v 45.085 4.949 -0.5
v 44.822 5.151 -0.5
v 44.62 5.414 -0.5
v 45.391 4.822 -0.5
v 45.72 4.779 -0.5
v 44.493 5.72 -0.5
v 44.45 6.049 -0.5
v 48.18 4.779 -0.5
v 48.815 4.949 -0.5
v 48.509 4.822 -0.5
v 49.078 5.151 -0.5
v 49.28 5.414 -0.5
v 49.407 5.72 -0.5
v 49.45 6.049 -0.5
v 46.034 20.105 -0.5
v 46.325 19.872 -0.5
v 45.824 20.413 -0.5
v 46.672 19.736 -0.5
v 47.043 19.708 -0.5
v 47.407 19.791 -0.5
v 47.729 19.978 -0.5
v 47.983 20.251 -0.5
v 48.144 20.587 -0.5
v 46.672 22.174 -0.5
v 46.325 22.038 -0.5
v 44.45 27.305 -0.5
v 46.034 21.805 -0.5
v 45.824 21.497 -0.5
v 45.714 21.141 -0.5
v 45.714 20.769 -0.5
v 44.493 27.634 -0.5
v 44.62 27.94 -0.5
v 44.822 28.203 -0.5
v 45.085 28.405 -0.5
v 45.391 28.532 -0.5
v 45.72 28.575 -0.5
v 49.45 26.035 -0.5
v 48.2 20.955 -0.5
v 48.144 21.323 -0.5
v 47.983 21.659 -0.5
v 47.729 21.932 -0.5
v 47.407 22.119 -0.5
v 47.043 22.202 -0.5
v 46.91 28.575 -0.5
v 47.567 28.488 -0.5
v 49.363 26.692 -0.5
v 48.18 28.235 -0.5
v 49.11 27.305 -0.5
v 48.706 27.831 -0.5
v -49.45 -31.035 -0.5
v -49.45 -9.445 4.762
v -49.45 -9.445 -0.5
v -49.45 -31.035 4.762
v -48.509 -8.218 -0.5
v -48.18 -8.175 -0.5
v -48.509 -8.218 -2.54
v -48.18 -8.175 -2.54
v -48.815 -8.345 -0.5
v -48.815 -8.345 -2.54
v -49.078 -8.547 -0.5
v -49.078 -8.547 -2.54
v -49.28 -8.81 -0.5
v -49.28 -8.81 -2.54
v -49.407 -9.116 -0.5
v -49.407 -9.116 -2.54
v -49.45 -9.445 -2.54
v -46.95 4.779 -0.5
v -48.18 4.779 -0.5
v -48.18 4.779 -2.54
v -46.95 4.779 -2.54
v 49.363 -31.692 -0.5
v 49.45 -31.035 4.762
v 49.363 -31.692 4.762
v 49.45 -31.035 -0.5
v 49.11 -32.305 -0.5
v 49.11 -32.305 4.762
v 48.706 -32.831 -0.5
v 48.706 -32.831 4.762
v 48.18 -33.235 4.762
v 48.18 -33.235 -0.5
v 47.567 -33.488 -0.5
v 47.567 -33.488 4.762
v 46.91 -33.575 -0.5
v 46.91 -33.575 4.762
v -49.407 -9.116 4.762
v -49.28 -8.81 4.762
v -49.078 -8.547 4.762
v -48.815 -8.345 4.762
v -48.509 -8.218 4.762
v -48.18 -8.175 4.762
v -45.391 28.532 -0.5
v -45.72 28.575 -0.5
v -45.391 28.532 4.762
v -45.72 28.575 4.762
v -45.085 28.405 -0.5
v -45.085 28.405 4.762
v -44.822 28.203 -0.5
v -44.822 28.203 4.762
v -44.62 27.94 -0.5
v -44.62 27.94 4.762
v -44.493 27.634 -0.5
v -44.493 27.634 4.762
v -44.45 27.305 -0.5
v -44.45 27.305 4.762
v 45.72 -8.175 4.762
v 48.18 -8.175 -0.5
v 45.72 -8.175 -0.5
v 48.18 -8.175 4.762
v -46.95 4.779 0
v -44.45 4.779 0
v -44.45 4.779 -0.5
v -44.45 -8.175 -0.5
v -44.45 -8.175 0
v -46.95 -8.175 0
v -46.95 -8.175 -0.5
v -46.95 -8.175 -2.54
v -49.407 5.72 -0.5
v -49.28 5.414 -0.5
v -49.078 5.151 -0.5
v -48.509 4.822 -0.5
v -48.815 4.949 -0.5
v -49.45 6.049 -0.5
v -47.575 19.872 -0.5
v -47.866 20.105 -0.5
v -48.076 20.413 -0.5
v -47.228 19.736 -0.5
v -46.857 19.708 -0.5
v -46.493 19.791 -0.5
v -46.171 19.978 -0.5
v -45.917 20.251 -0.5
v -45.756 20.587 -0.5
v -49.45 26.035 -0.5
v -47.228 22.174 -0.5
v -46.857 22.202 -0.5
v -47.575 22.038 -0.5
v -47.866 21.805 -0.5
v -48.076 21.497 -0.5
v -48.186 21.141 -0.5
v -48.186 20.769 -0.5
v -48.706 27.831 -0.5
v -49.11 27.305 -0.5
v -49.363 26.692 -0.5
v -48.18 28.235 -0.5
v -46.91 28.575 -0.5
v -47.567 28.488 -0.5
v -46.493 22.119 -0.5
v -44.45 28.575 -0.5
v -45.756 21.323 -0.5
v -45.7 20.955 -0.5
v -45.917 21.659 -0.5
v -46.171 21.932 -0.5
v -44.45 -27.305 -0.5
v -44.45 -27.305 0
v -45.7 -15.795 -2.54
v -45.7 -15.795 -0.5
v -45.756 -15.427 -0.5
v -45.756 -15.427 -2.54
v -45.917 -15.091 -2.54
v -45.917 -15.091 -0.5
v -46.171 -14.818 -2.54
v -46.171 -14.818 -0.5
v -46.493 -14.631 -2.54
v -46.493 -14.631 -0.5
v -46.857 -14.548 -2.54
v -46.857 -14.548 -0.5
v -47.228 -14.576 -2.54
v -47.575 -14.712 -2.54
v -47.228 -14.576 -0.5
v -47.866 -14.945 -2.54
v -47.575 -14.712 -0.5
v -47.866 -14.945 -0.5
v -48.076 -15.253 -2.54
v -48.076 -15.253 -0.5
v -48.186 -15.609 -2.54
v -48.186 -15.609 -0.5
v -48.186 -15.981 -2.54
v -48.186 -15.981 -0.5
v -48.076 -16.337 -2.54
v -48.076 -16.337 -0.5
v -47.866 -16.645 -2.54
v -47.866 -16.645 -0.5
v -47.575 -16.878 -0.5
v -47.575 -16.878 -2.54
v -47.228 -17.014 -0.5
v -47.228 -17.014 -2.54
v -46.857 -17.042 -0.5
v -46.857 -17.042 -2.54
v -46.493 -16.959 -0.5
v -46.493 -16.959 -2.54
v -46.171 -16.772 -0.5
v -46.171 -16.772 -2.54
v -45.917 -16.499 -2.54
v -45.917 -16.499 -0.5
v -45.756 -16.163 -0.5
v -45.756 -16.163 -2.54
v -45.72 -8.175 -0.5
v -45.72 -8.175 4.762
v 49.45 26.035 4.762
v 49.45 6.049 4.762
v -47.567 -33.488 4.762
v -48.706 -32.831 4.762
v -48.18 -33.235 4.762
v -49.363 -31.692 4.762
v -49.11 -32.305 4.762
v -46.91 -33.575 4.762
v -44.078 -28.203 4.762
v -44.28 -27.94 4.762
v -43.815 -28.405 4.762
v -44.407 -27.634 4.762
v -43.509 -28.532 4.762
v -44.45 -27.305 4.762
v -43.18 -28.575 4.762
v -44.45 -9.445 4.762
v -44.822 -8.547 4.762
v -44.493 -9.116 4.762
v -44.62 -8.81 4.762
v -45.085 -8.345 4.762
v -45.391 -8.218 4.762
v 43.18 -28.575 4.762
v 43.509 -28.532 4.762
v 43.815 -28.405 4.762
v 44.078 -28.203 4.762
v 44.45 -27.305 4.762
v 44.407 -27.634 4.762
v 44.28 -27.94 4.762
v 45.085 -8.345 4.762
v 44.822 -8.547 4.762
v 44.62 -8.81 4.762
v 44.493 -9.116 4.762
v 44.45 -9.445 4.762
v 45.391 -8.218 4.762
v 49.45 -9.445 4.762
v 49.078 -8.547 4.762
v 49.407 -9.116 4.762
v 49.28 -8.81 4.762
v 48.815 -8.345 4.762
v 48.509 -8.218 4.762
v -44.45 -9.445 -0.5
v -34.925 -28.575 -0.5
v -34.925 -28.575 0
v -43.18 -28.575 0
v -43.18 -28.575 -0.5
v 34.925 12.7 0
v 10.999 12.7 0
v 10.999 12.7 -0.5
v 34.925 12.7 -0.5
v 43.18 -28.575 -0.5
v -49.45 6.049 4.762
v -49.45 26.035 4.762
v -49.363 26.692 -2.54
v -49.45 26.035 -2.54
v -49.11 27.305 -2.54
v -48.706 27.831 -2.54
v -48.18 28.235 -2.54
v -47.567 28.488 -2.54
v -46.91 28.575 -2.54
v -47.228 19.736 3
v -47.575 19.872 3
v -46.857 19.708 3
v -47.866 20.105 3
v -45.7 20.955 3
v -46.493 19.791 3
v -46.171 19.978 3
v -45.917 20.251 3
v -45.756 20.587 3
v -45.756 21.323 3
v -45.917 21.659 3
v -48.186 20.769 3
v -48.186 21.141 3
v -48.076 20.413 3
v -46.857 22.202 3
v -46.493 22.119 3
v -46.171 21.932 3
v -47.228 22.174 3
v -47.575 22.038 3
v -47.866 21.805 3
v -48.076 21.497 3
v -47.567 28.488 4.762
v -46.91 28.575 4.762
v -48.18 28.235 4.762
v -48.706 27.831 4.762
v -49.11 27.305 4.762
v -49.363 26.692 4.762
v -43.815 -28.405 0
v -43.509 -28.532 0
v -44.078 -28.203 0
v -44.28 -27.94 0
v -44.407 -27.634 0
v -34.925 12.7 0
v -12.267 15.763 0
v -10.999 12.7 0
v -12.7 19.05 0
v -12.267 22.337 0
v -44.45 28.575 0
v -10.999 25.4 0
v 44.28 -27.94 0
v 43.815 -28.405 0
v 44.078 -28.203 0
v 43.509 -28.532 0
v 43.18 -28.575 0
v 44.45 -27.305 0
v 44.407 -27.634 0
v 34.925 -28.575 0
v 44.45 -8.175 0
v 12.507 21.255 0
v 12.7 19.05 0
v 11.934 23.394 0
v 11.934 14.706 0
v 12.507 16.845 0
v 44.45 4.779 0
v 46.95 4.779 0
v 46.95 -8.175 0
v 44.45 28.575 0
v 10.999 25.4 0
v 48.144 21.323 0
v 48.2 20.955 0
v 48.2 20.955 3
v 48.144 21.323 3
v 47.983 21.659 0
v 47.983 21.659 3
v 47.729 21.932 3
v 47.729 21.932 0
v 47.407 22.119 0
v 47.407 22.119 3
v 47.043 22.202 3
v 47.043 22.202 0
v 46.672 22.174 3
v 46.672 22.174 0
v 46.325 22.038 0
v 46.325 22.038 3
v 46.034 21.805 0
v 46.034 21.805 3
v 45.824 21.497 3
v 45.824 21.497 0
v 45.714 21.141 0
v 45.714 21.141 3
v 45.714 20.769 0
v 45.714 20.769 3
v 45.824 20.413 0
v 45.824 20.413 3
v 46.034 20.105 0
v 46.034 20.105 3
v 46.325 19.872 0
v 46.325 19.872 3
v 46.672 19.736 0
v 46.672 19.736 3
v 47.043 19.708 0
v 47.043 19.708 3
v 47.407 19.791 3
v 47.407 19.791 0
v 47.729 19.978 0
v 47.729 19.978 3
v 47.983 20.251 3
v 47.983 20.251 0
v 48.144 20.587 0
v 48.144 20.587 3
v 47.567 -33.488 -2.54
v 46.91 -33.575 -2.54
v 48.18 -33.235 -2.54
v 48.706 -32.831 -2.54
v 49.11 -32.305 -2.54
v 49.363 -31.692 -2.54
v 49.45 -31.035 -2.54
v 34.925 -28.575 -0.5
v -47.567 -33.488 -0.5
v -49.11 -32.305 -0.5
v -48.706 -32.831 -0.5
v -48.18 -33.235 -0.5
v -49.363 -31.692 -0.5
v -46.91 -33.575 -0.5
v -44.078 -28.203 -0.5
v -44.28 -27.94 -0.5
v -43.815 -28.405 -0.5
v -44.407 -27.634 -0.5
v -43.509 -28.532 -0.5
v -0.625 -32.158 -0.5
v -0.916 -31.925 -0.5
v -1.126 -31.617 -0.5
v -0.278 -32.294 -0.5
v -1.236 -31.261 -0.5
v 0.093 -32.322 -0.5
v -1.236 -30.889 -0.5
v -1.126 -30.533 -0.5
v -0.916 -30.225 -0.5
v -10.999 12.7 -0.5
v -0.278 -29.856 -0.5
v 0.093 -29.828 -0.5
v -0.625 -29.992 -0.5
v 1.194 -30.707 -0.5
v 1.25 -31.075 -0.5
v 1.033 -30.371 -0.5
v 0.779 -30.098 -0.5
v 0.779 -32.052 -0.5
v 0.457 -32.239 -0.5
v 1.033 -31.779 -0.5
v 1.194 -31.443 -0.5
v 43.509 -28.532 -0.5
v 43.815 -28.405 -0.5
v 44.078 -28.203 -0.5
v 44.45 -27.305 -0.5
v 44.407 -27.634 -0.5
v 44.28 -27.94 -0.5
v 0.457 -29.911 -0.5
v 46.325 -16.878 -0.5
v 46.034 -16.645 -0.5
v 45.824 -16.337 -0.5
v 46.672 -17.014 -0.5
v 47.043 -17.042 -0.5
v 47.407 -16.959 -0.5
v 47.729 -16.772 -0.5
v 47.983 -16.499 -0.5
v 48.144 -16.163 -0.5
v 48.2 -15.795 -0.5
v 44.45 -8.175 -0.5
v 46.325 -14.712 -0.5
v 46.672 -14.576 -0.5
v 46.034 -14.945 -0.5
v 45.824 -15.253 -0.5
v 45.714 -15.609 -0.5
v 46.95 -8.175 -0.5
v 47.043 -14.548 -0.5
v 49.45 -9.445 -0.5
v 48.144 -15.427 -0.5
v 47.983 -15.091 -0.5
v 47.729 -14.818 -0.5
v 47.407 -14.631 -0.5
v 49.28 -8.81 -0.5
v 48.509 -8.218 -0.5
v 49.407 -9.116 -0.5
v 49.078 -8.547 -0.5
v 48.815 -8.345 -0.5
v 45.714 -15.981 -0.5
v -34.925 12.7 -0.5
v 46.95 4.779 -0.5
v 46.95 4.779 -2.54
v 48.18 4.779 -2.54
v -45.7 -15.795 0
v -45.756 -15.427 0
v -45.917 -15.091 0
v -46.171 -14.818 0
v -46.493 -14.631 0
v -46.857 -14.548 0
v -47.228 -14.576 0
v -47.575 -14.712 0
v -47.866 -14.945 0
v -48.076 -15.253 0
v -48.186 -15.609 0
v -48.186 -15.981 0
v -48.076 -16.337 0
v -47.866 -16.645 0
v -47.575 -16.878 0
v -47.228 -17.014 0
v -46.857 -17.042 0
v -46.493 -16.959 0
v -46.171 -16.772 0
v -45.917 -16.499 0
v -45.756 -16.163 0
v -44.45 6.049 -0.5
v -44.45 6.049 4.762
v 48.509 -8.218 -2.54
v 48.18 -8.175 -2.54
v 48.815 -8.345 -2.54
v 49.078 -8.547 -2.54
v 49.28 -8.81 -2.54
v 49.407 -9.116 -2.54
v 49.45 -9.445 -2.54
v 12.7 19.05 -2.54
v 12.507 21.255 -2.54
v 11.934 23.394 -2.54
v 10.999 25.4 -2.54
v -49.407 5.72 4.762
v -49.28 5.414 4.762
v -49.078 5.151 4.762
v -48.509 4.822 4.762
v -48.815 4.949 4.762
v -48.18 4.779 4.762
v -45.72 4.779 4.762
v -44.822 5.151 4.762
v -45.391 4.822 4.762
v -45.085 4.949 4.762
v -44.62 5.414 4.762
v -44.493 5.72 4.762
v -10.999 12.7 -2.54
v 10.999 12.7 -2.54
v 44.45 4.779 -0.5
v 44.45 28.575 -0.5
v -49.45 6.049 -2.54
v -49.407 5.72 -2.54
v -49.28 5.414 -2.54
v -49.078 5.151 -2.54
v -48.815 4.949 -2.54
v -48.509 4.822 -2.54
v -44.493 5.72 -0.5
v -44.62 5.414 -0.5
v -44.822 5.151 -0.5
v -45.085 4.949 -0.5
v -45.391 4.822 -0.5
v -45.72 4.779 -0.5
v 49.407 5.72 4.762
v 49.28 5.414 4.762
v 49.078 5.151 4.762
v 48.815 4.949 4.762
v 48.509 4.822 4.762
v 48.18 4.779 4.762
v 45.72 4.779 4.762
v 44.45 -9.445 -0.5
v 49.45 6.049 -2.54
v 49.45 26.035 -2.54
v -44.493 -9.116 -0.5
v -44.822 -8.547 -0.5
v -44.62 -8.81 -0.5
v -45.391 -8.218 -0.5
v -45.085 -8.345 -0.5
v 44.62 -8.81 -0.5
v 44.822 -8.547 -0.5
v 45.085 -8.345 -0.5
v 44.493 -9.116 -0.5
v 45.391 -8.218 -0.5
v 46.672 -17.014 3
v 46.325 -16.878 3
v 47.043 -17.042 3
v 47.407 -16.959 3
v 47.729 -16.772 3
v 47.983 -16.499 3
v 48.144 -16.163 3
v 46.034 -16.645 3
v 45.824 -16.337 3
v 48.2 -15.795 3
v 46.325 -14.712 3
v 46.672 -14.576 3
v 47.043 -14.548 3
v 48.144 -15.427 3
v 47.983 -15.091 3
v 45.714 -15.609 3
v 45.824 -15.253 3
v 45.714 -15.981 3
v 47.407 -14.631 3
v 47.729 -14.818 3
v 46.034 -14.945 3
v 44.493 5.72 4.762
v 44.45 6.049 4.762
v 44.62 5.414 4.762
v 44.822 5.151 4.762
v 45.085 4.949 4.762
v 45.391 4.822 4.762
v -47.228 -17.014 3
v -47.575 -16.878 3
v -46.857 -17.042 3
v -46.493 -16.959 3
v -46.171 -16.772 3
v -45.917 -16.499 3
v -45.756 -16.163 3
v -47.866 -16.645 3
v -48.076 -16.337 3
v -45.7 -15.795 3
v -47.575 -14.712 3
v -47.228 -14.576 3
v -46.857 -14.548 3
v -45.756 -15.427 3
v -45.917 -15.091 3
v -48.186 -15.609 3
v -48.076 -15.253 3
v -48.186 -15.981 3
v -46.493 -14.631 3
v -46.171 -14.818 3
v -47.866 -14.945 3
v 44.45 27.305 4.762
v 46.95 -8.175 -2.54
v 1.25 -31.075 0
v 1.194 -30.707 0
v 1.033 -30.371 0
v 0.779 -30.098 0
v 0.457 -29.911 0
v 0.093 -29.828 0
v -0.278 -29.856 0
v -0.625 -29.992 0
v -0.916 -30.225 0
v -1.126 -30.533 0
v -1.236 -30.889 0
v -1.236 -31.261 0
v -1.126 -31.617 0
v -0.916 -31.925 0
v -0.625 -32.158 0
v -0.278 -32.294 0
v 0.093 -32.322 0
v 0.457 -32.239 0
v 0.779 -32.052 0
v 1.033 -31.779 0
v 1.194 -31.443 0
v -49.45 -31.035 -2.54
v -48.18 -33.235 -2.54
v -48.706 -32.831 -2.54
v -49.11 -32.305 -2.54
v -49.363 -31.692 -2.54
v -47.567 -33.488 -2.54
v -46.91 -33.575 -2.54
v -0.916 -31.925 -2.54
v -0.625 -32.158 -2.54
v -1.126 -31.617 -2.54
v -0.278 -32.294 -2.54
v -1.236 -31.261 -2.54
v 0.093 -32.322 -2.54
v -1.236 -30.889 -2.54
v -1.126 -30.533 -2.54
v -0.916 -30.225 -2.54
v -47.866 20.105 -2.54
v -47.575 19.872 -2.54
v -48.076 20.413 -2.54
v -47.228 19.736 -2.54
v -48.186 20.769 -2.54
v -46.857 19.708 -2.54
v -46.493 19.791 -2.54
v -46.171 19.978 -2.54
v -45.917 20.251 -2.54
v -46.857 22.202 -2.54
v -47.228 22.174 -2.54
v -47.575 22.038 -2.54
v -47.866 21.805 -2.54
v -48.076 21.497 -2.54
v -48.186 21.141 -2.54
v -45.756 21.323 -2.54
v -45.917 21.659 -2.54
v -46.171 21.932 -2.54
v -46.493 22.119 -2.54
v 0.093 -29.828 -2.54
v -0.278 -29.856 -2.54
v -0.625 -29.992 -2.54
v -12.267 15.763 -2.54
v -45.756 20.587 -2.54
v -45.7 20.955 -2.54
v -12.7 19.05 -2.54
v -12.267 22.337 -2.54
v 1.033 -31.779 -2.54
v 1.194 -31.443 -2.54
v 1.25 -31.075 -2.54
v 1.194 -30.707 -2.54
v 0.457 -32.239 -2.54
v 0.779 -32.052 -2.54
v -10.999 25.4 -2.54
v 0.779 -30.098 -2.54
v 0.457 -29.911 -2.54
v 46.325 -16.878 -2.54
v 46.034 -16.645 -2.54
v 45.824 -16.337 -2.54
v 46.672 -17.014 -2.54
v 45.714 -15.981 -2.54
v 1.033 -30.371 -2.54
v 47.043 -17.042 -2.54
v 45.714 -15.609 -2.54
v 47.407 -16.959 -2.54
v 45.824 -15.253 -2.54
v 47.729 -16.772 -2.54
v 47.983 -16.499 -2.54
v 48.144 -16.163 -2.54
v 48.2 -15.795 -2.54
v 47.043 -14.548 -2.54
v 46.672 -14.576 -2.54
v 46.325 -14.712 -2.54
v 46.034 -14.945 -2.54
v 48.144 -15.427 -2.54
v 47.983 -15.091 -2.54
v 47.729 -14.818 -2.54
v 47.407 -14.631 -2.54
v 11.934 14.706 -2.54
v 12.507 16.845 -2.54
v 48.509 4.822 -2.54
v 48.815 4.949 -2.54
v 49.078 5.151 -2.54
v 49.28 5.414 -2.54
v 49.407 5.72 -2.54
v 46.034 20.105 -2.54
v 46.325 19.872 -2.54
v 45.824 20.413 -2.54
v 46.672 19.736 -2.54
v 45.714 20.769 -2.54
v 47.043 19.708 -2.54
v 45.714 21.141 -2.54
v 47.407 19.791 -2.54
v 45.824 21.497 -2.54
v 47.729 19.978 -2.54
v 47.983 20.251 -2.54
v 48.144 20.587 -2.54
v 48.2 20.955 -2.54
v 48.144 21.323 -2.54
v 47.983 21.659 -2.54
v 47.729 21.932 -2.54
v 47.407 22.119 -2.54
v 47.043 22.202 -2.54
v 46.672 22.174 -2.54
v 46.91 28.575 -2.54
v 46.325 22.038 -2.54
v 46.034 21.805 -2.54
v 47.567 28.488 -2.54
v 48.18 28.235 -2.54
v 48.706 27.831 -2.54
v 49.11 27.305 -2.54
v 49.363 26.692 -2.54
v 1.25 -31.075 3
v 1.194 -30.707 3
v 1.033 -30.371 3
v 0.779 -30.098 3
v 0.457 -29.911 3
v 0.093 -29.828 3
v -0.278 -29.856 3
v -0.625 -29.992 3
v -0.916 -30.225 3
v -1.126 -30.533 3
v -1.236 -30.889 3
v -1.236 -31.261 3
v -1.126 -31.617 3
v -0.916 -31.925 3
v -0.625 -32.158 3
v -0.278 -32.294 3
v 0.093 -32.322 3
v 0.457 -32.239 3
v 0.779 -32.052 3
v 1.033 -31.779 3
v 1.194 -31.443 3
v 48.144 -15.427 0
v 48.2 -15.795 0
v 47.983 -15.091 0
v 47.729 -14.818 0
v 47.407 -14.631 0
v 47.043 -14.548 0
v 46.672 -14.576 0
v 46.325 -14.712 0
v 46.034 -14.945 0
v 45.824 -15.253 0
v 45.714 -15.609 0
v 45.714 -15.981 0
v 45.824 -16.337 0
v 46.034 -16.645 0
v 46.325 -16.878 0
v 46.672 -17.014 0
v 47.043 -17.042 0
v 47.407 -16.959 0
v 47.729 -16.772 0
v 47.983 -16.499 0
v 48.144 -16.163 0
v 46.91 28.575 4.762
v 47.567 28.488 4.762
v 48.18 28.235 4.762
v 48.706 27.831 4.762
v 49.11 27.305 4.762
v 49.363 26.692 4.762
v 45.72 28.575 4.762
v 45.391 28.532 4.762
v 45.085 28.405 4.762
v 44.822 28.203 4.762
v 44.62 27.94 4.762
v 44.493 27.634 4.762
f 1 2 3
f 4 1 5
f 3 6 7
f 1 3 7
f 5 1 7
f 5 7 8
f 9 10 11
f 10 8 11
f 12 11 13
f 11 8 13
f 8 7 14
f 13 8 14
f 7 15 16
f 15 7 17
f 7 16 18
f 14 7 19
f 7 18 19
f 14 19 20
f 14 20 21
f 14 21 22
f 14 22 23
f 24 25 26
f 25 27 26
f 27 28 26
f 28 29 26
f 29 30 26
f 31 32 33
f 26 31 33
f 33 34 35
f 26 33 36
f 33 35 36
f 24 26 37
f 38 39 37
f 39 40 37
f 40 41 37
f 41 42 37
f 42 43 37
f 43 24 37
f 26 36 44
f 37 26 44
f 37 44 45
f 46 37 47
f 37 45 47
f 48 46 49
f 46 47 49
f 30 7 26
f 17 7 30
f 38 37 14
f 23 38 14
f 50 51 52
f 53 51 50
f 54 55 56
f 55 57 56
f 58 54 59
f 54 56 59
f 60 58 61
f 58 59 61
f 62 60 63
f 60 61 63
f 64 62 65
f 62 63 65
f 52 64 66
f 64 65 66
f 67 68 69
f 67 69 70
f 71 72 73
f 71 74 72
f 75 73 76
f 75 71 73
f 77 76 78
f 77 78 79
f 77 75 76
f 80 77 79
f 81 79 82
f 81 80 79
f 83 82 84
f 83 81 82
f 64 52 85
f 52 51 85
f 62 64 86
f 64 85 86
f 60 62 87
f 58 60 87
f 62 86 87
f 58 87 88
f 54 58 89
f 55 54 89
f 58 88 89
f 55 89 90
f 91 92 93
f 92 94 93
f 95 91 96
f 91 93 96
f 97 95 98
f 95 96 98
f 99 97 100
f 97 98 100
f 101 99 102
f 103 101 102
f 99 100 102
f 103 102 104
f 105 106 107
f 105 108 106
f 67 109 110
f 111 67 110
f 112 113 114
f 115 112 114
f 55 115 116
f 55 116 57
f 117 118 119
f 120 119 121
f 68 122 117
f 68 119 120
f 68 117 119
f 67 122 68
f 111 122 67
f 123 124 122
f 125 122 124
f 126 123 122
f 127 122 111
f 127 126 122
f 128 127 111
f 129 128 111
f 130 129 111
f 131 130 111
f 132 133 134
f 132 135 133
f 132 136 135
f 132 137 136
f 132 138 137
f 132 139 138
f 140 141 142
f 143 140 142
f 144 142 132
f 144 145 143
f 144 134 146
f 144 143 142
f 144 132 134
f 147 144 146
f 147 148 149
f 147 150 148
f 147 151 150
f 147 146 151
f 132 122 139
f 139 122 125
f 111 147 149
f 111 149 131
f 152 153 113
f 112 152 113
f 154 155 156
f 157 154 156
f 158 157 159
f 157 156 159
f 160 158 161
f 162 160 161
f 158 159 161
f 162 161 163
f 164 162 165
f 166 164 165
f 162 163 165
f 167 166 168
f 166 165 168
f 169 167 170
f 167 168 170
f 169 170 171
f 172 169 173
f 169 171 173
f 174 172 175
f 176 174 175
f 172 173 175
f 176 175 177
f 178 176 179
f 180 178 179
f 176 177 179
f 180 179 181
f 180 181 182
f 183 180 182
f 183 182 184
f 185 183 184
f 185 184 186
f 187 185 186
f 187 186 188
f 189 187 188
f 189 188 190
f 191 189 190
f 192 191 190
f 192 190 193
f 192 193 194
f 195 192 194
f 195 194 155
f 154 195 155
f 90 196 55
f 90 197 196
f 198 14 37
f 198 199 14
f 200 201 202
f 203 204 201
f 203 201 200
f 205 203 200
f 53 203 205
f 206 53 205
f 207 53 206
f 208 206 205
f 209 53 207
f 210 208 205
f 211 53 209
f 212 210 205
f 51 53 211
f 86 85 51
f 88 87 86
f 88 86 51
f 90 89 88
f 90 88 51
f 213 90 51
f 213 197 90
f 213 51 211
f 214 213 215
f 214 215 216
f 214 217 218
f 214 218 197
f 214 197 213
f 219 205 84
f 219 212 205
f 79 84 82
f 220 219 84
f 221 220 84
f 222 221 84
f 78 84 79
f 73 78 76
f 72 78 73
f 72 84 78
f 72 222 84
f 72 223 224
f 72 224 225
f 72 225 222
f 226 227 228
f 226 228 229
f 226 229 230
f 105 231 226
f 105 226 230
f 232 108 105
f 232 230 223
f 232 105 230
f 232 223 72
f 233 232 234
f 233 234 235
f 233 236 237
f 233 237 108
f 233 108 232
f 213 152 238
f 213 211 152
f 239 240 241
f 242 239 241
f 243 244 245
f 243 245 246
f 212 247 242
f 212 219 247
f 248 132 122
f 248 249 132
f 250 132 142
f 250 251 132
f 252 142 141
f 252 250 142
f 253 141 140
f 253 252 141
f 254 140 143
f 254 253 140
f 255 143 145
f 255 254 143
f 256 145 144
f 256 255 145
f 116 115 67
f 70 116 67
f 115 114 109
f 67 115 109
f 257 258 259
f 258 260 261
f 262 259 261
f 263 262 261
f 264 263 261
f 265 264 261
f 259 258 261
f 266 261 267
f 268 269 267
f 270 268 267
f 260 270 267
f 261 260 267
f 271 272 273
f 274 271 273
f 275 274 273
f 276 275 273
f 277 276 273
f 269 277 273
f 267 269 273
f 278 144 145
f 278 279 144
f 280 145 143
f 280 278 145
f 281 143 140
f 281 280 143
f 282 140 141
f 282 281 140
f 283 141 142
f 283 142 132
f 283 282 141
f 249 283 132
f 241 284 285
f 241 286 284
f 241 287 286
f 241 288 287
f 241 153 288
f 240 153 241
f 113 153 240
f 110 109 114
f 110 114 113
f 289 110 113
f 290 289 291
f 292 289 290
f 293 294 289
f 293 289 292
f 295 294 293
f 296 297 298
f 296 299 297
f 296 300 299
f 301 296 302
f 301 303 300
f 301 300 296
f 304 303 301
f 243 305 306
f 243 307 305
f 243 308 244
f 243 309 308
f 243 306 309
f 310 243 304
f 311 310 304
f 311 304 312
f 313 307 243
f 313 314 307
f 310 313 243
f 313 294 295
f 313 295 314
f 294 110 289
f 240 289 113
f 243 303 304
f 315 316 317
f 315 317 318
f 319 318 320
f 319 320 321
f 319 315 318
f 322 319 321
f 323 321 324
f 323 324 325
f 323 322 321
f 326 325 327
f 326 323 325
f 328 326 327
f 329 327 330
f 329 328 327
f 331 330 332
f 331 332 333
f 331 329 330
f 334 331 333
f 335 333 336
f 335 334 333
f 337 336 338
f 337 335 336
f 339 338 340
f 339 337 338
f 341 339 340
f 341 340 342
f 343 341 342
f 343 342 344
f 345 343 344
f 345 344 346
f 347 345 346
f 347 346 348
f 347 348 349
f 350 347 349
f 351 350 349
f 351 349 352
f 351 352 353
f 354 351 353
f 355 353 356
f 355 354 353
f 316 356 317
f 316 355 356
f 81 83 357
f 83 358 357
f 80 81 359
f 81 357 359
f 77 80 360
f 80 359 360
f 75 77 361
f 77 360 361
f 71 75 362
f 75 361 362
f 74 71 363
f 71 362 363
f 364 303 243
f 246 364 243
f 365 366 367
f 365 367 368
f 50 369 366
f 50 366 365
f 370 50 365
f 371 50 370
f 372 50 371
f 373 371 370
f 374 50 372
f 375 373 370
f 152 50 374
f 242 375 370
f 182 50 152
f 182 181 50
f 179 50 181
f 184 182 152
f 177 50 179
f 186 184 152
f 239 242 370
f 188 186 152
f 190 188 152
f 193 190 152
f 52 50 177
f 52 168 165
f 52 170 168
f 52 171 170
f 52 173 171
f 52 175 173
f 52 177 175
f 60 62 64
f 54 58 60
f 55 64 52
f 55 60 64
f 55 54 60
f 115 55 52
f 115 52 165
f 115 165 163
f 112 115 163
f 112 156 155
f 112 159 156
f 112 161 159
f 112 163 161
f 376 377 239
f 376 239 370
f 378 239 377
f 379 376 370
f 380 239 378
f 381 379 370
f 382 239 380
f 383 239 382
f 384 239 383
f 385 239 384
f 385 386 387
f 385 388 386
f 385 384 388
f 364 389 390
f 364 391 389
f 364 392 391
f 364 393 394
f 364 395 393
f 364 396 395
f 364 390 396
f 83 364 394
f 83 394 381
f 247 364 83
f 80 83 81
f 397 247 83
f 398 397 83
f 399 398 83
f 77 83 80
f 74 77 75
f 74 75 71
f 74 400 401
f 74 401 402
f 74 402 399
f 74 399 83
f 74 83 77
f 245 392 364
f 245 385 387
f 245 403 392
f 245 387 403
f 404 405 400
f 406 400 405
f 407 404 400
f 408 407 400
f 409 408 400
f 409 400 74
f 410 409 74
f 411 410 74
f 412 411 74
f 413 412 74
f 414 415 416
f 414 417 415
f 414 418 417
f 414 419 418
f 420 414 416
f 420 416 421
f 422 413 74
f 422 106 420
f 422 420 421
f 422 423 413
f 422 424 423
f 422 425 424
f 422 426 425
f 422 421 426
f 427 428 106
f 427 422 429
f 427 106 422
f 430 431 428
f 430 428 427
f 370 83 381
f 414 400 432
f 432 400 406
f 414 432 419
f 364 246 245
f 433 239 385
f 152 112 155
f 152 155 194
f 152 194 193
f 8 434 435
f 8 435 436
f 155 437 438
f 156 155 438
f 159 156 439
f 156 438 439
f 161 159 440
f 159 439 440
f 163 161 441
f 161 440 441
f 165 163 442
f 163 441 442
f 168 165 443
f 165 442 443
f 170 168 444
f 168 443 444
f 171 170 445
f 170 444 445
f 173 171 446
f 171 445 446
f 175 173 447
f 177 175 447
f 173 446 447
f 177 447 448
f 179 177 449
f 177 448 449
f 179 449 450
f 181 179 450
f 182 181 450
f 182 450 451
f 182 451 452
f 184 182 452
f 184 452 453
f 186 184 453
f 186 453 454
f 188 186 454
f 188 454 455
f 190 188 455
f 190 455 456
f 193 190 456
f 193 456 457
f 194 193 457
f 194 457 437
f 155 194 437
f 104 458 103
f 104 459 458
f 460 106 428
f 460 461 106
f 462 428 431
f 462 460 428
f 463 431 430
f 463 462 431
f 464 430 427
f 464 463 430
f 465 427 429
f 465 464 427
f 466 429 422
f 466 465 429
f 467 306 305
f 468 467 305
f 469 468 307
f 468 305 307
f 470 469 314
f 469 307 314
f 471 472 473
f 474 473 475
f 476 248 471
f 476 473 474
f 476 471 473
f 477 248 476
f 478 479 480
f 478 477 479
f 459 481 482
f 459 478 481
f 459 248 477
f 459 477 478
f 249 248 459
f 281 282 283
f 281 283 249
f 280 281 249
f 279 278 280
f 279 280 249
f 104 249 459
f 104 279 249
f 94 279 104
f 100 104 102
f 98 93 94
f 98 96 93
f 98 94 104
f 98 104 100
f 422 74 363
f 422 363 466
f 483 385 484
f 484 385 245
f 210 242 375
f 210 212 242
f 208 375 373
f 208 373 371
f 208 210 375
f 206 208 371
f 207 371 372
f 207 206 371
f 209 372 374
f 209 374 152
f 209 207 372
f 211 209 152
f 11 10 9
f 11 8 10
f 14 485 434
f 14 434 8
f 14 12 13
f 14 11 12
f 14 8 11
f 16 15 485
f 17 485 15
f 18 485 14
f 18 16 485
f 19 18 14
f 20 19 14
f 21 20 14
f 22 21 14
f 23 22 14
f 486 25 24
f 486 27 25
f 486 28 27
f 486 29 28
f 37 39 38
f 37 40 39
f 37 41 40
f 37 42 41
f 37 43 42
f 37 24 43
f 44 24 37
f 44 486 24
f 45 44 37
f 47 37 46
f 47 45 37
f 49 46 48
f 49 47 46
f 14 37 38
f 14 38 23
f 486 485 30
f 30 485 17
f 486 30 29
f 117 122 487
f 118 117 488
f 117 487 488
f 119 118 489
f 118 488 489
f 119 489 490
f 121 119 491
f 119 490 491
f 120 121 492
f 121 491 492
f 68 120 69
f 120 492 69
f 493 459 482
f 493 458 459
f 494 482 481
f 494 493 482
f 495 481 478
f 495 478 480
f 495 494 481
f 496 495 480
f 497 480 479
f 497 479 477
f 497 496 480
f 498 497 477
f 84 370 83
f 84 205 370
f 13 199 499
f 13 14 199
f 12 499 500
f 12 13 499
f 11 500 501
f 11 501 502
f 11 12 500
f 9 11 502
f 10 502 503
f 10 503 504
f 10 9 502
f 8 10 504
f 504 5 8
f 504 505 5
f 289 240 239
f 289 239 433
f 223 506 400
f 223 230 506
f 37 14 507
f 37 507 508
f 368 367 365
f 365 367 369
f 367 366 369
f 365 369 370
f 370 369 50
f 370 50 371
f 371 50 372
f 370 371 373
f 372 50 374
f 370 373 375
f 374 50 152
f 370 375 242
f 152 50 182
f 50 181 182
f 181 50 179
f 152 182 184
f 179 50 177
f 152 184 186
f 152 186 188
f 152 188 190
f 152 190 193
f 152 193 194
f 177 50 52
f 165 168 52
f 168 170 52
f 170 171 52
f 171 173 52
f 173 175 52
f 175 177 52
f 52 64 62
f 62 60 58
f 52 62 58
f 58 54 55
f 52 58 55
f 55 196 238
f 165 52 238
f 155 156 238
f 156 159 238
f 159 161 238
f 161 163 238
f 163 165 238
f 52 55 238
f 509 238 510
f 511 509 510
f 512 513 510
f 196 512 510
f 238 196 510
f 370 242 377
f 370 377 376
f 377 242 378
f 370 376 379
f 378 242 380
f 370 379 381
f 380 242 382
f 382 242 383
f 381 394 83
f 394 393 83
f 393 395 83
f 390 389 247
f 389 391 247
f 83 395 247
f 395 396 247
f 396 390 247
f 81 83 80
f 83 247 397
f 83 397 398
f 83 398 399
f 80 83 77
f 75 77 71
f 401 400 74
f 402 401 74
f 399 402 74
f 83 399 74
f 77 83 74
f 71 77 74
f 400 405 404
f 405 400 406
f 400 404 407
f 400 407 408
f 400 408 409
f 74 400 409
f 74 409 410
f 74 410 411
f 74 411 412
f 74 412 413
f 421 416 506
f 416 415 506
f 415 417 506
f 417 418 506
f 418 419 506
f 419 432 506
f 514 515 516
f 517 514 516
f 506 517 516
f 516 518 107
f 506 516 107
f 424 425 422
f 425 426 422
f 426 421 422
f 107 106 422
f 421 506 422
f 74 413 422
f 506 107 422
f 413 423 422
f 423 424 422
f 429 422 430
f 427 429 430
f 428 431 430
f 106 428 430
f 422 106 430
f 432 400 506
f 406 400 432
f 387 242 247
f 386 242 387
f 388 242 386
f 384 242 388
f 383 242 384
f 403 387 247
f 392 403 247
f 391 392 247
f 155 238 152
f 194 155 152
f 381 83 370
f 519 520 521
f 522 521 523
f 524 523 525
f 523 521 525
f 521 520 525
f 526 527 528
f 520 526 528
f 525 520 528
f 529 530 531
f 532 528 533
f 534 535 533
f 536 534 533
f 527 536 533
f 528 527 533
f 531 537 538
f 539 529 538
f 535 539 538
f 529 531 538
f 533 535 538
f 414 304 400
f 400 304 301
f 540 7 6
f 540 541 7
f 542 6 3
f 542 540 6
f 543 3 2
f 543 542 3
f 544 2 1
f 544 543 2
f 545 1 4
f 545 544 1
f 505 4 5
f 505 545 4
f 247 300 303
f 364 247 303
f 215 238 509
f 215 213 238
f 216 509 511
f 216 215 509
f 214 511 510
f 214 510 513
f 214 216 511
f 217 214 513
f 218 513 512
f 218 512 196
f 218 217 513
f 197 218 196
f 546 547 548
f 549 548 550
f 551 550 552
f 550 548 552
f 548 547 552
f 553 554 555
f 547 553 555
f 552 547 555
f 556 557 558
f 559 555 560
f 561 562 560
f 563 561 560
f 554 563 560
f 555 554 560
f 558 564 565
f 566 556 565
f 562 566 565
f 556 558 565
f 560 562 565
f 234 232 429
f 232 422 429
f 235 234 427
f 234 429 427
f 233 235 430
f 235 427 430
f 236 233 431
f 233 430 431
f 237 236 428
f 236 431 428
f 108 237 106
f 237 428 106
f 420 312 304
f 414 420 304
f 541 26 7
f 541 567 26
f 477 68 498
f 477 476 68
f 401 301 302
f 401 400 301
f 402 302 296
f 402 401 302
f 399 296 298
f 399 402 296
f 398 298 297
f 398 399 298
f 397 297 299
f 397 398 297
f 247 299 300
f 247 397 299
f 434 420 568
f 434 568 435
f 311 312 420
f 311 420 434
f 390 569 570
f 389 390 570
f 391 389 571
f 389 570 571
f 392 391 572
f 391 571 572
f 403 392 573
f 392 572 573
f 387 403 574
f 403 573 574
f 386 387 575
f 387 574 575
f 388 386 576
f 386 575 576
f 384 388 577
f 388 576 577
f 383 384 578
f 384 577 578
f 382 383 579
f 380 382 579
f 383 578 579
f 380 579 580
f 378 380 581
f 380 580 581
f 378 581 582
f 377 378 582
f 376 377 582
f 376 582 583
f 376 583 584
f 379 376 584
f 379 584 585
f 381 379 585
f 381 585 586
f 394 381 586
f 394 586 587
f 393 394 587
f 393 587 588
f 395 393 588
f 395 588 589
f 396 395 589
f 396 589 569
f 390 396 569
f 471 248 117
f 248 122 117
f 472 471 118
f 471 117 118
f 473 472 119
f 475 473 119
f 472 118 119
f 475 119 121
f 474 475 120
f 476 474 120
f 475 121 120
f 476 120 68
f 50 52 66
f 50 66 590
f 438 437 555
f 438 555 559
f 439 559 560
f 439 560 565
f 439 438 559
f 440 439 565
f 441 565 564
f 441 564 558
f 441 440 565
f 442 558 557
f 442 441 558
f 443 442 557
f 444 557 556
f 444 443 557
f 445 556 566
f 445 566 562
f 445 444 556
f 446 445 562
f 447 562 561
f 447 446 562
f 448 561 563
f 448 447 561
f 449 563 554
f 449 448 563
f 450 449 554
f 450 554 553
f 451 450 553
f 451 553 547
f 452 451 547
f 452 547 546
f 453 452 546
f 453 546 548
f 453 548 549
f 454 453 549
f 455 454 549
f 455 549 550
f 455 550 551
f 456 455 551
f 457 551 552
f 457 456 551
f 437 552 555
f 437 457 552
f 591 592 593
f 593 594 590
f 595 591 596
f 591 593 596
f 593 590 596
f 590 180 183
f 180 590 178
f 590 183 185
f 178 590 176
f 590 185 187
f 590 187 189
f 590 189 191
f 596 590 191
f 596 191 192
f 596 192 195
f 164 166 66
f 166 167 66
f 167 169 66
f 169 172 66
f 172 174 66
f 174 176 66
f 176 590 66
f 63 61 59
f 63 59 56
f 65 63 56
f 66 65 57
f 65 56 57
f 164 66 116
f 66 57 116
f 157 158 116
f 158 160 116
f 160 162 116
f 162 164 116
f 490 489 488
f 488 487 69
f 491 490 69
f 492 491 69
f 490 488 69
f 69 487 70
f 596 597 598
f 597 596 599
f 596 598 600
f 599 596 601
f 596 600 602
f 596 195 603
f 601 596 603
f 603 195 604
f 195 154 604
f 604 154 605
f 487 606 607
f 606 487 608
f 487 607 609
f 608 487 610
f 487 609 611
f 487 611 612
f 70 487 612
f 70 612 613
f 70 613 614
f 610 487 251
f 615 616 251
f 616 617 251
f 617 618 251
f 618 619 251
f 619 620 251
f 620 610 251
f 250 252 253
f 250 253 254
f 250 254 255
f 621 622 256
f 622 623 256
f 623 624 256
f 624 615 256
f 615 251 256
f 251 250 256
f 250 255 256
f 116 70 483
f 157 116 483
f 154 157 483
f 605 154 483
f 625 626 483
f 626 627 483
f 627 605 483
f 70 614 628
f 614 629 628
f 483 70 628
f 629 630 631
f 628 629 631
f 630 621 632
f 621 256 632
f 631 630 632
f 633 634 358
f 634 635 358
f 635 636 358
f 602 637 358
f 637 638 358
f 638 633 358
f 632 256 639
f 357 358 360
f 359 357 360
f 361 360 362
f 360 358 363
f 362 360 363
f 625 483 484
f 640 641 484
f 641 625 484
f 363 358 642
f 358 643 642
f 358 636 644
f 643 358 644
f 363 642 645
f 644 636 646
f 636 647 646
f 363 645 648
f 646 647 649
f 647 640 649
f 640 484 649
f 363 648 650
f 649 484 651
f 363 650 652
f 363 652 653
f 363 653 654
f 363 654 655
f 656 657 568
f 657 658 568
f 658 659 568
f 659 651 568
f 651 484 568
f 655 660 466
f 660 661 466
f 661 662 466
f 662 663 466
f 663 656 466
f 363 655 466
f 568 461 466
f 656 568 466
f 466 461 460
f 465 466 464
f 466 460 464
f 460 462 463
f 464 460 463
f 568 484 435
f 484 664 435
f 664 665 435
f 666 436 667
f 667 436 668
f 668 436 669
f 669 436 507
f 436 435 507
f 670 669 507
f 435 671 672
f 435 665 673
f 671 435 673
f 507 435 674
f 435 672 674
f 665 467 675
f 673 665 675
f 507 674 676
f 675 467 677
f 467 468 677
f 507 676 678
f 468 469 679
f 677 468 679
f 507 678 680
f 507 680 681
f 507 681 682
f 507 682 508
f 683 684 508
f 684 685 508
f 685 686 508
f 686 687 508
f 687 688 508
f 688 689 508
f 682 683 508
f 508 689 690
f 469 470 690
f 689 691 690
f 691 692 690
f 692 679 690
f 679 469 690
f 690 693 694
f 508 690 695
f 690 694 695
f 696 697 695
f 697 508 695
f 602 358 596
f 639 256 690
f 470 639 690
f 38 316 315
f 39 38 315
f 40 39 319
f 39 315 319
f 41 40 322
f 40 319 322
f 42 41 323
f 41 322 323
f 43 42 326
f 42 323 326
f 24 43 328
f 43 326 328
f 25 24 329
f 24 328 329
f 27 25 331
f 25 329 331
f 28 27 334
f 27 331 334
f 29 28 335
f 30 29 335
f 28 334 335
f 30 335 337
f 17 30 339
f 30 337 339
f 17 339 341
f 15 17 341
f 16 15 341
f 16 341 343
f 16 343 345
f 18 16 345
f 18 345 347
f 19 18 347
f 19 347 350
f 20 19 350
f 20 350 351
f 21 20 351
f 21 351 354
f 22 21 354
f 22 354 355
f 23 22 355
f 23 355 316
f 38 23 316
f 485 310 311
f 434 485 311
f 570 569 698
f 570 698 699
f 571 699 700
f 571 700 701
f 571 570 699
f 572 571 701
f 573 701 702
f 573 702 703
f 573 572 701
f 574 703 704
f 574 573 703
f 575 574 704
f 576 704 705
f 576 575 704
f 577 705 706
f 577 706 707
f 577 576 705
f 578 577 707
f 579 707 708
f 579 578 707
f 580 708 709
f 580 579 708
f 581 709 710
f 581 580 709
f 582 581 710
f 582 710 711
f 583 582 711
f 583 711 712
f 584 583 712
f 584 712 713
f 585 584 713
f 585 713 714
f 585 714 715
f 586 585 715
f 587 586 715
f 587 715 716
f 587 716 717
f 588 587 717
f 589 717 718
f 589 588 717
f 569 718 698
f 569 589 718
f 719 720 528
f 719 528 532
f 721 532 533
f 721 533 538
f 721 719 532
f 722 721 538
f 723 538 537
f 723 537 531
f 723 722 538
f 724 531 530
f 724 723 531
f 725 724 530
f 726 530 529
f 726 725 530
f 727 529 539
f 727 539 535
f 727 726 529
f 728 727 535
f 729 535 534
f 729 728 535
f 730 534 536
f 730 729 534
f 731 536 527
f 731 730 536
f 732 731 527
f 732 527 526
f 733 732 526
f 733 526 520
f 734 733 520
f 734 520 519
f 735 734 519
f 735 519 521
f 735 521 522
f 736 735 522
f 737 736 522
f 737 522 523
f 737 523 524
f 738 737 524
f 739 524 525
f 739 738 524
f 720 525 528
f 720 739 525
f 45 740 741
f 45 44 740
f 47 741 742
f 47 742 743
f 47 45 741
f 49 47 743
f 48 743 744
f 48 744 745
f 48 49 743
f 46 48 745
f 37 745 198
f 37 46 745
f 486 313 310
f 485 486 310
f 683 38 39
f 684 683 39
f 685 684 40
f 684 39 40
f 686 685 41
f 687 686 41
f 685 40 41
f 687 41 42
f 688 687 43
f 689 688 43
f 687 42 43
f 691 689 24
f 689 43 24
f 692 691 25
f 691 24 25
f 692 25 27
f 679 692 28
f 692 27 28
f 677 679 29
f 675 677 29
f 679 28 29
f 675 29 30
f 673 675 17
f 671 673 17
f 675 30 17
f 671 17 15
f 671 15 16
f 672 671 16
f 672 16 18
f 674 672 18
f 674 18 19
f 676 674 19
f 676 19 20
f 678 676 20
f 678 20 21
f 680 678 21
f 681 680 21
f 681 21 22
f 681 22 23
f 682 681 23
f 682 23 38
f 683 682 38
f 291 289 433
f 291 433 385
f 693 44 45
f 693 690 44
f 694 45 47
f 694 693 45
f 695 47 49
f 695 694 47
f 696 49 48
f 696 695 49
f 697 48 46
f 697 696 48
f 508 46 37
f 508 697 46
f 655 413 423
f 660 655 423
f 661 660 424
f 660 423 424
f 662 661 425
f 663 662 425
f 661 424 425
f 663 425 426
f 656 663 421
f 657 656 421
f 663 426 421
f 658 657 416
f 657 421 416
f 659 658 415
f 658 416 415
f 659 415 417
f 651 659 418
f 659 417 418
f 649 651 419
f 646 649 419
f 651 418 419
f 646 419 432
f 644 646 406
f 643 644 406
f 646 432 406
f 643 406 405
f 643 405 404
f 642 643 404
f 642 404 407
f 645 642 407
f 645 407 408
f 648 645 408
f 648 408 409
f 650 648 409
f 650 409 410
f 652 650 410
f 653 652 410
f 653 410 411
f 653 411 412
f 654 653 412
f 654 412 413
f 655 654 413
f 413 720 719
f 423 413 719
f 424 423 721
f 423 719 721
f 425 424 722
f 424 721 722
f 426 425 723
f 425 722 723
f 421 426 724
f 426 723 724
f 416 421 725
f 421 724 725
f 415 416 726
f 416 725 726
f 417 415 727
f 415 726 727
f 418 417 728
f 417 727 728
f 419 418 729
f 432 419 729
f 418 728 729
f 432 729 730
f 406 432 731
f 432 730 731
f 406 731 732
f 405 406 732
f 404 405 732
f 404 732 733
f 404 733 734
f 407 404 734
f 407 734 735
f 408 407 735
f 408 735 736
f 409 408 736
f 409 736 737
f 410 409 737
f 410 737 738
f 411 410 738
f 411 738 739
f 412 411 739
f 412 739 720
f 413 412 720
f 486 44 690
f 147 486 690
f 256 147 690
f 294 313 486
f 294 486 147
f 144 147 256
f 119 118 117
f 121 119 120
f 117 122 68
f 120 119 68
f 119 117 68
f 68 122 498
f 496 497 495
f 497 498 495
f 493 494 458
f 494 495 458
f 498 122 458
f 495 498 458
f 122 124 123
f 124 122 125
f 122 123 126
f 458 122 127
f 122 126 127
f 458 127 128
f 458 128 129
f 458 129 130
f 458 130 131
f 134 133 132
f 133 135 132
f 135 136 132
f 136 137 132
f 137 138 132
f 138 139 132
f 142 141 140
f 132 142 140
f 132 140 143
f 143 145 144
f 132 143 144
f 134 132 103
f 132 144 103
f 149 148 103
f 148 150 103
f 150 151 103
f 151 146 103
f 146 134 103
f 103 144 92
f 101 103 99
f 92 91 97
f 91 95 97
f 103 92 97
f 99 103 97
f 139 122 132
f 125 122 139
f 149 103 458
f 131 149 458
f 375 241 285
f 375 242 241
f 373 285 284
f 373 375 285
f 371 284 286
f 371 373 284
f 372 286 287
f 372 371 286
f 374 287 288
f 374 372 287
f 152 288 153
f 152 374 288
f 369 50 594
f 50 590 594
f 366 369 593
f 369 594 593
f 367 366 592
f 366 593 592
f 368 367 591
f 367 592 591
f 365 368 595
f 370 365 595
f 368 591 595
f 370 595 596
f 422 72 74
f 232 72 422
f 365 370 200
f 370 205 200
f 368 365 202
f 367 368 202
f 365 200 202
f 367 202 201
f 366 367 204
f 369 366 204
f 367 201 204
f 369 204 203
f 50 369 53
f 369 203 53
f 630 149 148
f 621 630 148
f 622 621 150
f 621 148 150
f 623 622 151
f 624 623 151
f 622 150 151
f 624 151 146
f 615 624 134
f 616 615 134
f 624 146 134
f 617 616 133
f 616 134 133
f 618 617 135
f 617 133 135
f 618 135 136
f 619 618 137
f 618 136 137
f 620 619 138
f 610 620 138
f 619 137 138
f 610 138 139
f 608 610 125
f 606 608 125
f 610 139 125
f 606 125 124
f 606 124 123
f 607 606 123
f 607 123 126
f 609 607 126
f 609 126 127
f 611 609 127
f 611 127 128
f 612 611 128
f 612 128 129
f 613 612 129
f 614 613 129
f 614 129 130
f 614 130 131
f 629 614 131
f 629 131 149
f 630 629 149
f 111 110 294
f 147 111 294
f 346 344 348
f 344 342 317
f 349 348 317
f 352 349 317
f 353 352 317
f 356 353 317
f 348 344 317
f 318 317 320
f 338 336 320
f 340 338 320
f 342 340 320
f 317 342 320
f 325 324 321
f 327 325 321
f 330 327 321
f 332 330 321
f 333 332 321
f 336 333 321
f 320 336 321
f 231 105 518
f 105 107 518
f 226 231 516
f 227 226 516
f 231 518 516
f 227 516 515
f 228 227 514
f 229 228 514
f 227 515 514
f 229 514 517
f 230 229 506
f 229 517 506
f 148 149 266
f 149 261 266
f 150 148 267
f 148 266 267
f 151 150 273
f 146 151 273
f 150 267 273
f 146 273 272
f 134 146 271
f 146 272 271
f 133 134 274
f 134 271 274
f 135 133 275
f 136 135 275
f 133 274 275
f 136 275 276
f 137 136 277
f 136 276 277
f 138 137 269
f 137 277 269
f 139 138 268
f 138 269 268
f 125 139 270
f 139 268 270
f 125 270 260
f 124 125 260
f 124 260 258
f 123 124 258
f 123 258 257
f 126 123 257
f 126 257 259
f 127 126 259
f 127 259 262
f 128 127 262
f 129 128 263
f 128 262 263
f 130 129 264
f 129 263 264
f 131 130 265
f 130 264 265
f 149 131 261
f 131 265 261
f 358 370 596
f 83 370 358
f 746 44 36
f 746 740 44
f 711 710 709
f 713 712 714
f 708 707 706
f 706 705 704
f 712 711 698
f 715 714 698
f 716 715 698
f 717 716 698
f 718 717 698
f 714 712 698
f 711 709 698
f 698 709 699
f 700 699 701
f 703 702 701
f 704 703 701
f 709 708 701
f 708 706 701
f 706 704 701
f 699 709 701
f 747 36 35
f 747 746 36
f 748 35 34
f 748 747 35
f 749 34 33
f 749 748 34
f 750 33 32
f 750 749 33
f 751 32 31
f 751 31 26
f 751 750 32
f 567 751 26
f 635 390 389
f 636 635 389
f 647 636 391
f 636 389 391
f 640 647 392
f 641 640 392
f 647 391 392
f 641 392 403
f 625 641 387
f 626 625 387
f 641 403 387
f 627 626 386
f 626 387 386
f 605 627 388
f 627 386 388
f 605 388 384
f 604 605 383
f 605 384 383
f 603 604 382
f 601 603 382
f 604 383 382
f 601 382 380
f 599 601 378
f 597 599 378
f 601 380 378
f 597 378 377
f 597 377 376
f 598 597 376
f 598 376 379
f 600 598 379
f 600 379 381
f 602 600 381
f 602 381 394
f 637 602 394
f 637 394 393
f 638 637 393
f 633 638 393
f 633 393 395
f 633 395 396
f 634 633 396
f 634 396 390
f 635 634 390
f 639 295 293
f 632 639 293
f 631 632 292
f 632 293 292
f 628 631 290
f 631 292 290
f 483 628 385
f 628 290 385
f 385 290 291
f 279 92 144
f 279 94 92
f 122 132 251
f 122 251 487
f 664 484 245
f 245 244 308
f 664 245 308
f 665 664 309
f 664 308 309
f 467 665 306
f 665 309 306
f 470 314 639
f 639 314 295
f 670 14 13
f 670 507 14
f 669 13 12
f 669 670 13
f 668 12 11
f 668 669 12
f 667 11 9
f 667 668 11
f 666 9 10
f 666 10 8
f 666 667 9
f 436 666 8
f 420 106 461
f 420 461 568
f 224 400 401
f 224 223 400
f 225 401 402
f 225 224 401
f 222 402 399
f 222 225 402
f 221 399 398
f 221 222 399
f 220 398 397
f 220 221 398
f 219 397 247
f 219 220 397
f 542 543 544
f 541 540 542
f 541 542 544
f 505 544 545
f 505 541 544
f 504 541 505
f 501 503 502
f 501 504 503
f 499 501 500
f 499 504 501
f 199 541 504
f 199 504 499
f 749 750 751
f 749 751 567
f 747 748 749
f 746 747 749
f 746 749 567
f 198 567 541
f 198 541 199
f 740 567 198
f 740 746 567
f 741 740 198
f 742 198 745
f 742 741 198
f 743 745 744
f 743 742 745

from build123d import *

# Parameters (mm, degrees)
F0_R     = 1.25
F0_W     = 2.5
F0_H     = 12.954
F0_W_2   = 69.85
F0_H_2   = 41.275
F1_DEPTH = 2.54
F2_DEPTH = 4.7625
F3_DEPTH = 0.5
F4_DEPTH = 0.5
F5_DEPTH = 3
F6_R     = 2.54
F6_2_R   = 2.54
F6_3_R   = 2.54
F6_4_R   = 2.54
F7_R     = 1.27
F7_2_R   = 1.27
F7_3_R   = 1.27
F7_4_R   = 1.27
F9_DEPTH = 2.541


with BuildPart() as f1:
    # F0 (on Top) → F1 (new body)
    with BuildSketch(Plane.XY):
        Polygon((44.45, 4.779), (44.45, 28.575), (-44.45, 28.575), (-44.45, 4.779), (-44.45, -8.175), (-44.45, -28.575), (-34.925, -28.575), (-34.925, 12.7), (34.925, 12.7), (34.925, -28.575), (44.45, -28.575), (44.45, -8.175), align=None)
        Polygon((-44.45, 4.779), (-44.45, 28.575), (-49.45, 28.575), (-49.45, 4.779), (-46.95, 4.779), align=None)
        with Locations((-46.95, 20.955)):
            Circle(F0_R, mode=Mode.SUBTRACT)
        Polygon((46.95, -8.175), (44.45, -8.175), (44.45, -28.575), (34.925, -28.575), (-34.925, -28.575), (-44.45, -28.575), (-44.45, -8.175), (-46.95, -8.175), (-49.45, -8.175), (-49.45, -33.575), (49.45, -33.575), (49.45, -8.175), align=None)
        with Locations((-46.95, -15.795)):
            Circle(F0_R, mode=Mode.SUBTRACT)
        with Locations((0, -31.075)):
            Circle(F0_R, mode=Mode.SUBTRACT)
        with Locations((46.95, -15.795)):
            Circle(F0_R, mode=Mode.SUBTRACT)
        with Locations((-45.7, -1.698)):
            Rectangle(F0_W, F0_H)
        with Locations((45.7, -1.698)):
            Rectangle(F0_W, F0_H)
        Polygon((49.45, 28.575), (44.45, 28.575), (44.45, 4.779), (46.95, 4.779), (49.45, 4.779), align=None)
        with Locations((46.95, 20.955)):
            Circle(F0_R, mode=Mode.SUBTRACT)
        with Locations((0, -7.9375)):
            Rectangle(F0_W_2, F0_H_2)
    extrude(amount=-F1_DEPTH)

    # F0 (on Top) → F3 (cut)
    with BuildSketch(Plane.XY):
        with Locations((0, -7.9375)):
            Rectangle(F0_W_2, F0_H_2)
        Polygon((46.95, -8.175), (44.45, -8.175), (44.45, -28.575), (34.925, -28.575), (-34.925, -28.575), (-44.45, -28.575), (-44.45, -8.175), (-46.95, -8.175), (-49.45, -8.175), (-49.45, -33.575), (49.45, -33.575), (49.45, -8.175), align=None)
        with Locations((-46.95, -15.795)):
            Circle(F0_R, mode=Mode.SUBTRACT)
        with Locations((0, -31.075)):
            Circle(F0_R, mode=Mode.SUBTRACT)
        with Locations((46.95, -15.795)):
            Circle(F0_R, mode=Mode.SUBTRACT)
        Polygon((49.45, 28.575), (44.45, 28.575), (44.45, 4.779), (46.95, 4.779), (49.45, 4.779), align=None)
        with Locations((46.95, 20.955)):
            Circle(F0_R, mode=Mode.SUBTRACT)
        Polygon((-44.45, 4.779), (-44.45, 28.575), (-49.45, 28.575), (-49.45, 4.779), (-46.95, 4.779), align=None)
        with Locations((-46.95, 20.955)):
            Circle(F0_R, mode=Mode.SUBTRACT)
    extrude(amount=-F3_DEPTH, mode=Mode.SUBTRACT)

    # F6
    f6_edges = [f1.edges().sort_by_distance(p)[0] for p in [
        (-49.45, -33.575, -1.52),
        (-49.45, 28.575, -1.52),
        (49.45, -33.575, -1.52),
        (49.45, 28.575, -1.52),
    ]]
    fillet(f6_edges, radius=F6_R)

    # F7
    f7_edges = [f1.edges().sort_by_distance(p)[0] for p in [
        (49.45, 4.779, -1.52),
        (49.45, -8.175, -1.52),
        (-49.45, 4.779, -1.52),
        (-49.45, -8.175, -1.52),
        (44.45, -28.575, -0.25),
        (-44.45, -28.575, -0.25),
    ]]
    fillet(f7_edges, radius=F7_R)

    # F8 (on face) → F9 (cut, through all)
    with BuildSketch(Plane.XY):
        with BuildLine():
            ThreePointArc((10.9985226281, 12.7), (12.2672579939, 15.7629981272), (12.7, 19.05))
            ThreePointArc((12.7, 19.05), (12.2672579939, 22.3370018728), (10.9985226281, 25.4))
            Line((10.9985226281, 25.4), (-10.9985226281, 25.4))
            ThreePointArc((-10.9985226281, 25.4), (-12.7, 19.05), (-10.9985226281, 12.7))
            Line((-10.9985226281, 12.7), (10.9985226281, 12.7))
        make_face()
    extrude(amount=-F9_DEPTH, mode=Mode.SUBTRACT)


with BuildPart() as f2:
    # F0 (on Top) → F2 (new body)
    with BuildSketch(Plane.XY):
        Polygon((-44.45, 4.779), (-44.45, 28.575), (-49.45, 28.575), (-49.45, 4.779), (-46.95, 4.779), align=None)
        with Locations((-46.95, 20.955)):
            Circle(F0_R, mode=Mode.SUBTRACT)
        with Locations((-46.95, 20.955)):
            Circle(F0_R)
    extrude(amount=F2_DEPTH)

    # F4#3 (add): a face of the model
    f4_3_faces = [f2.faces().sort_by_distance(p)[0] for p in [
        (-46.95, 16.677, 0),
    ]]
    extrude(f4_3_faces, amount=F4_DEPTH)


with BuildPart() as f2b:
    # F0 (on Top) → F2, piece 2 (new body)
    with BuildSketch(Plane.XY):
        Polygon((49.45, 28.575), (44.45, 28.575), (44.45, 4.779), (46.95, 4.779), (49.45, 4.779), align=None)
        with Locations((46.95, 20.955)):
            Circle(F0_R, mode=Mode.SUBTRACT)
        with Locations((46.95, 20.955)):
            Circle(F0_R)
    extrude(amount=F2_DEPTH)

    # F4#2 (add): a face of the model
    f4_2_faces = [f2b.faces().sort_by_distance(p)[0] for p in [
        (46.95, 16.677, 0),
    ]]
    extrude(f4_2_faces, amount=F4_DEPTH)


with BuildPart() as f2c:
    # F0 (on Top) → F2, piece 3 (new body)
    with BuildSketch(Plane.XY):
        Polygon((46.95, -8.175), (44.45, -8.175), (44.45, -28.575), (34.925, -28.575), (-34.925, -28.575), (-44.45, -28.575), (-44.45, -8.175), (-46.95, -8.175), (-49.45, -8.175), (-49.45, -33.575), (49.45, -33.575), (49.45, -8.175), align=None)
        with Locations((-46.95, -15.795)):
            Circle(F0_R, mode=Mode.SUBTRACT)
        with Locations((0, -31.075)):
            Circle(F0_R, mode=Mode.SUBTRACT)
        with Locations((46.95, -15.795)):
            Circle(F0_R, mode=Mode.SUBTRACT)
        with Locations((-46.95, -15.795)):
            Circle(F0_R)
        with Locations((0, -31.075)):
            Circle(F0_R)
        with Locations((46.95, -15.795)):
            Circle(F0_R)
    extrude(amount=F2_DEPTH)

    # F4 (add): a face of the model
    f4_faces = [f2c.faces().sort_by_distance(p)[0] for p in [
        (45.4710959798, -18.375, 0),
    ]]
    extrude(f4_faces, amount=F4_DEPTH)


with BuildPart() as f5_tool:
    # F0 (on Top) → F5 (new body, symmetric)
    with BuildSketch(Plane.XY):
        with Locations((-46.95, -15.795)):
            Circle(F0_R)
        with Locations((0, -31.075)):
            Circle(F0_R)
        with Locations((46.95, -15.795)):
            Circle(F0_R)
        with Locations((46.95, 20.955)):
            Circle(F0_R)
        with Locations((-46.95, 20.955)):
            Circle(F0_R)
    extrude(amount=F5_DEPTH, both=True)


with BuildPart() as f2_1:
    add(f2.part)

    # F5: cut by f5_tool
    add(f5_tool.part, mode=Mode.SUBTRACT)

    # F6#2
    f6_2_edges = [f2_1.edges().sort_by_distance(p)[0] for p in [
        (-49.45, 28.575, 2.13125),
    ]]
    fillet(f6_2_edges, radius=F6_2_R)

    # F7#2
    f7_2_edges = [f2_1.edges().sort_by_distance(p)[0] for p in [
        (-49.45, 4.779, 2.13125),
        (-44.45, 4.779, 2.13125),
        (-44.45, 28.575, 2.13125),
    ]]
    fillet(f7_2_edges, radius=F7_2_R)


with BuildPart() as f2b_1:
    add(f2b.part)

    # F5: cut by f5_tool
    add(f5_tool.part, mode=Mode.SUBTRACT)

    # F6#3
    f6_3_edges = [f2b_1.edges().sort_by_distance(p)[0] for p in [
        (49.45, 28.575, 2.13125),
    ]]
    fillet(f6_3_edges, radius=F6_3_R)

    # F7#3
    f7_3_edges = [f2b_1.edges().sort_by_distance(p)[0] for p in [
        (49.45, 4.779, 2.13125),
        (44.45, 4.779, 2.13125),
        (44.45, 28.575, 2.13125),
    ]]
    fillet(f7_3_edges, radius=F7_3_R)


with BuildPart() as f2c_1:
    add(f2c.part)

    # F5: cut by f5_tool
    add(f5_tool.part, mode=Mode.SUBTRACT)

    # F6#4
    f6_4_edges = [f2c_1.edges().sort_by_distance(p)[0] for p in [
        (-49.45, -33.575, 2.13125),
        (49.45, -33.575, 2.13125),
    ]]
    fillet(f6_4_edges, radius=F6_4_R)

    # F7#4
    f7_4_edges = [f2c_1.edges().sort_by_distance(p)[0] for p in [
        (49.45, -8.175, 2.13125),
        (-49.45, -8.175, 2.13125),
        (-44.45, -8.175, 2.13125),
        (44.45, -8.175, 2.13125),
        (-44.45, -28.575, 2.13125),
        (44.45, -28.575, 2.13125),
    ]]
    fillet(f7_4_edges, radius=F7_4_R)


solid = Compound([f1.part, f2_1.part, f2b_1.part, f2c_1.part])
